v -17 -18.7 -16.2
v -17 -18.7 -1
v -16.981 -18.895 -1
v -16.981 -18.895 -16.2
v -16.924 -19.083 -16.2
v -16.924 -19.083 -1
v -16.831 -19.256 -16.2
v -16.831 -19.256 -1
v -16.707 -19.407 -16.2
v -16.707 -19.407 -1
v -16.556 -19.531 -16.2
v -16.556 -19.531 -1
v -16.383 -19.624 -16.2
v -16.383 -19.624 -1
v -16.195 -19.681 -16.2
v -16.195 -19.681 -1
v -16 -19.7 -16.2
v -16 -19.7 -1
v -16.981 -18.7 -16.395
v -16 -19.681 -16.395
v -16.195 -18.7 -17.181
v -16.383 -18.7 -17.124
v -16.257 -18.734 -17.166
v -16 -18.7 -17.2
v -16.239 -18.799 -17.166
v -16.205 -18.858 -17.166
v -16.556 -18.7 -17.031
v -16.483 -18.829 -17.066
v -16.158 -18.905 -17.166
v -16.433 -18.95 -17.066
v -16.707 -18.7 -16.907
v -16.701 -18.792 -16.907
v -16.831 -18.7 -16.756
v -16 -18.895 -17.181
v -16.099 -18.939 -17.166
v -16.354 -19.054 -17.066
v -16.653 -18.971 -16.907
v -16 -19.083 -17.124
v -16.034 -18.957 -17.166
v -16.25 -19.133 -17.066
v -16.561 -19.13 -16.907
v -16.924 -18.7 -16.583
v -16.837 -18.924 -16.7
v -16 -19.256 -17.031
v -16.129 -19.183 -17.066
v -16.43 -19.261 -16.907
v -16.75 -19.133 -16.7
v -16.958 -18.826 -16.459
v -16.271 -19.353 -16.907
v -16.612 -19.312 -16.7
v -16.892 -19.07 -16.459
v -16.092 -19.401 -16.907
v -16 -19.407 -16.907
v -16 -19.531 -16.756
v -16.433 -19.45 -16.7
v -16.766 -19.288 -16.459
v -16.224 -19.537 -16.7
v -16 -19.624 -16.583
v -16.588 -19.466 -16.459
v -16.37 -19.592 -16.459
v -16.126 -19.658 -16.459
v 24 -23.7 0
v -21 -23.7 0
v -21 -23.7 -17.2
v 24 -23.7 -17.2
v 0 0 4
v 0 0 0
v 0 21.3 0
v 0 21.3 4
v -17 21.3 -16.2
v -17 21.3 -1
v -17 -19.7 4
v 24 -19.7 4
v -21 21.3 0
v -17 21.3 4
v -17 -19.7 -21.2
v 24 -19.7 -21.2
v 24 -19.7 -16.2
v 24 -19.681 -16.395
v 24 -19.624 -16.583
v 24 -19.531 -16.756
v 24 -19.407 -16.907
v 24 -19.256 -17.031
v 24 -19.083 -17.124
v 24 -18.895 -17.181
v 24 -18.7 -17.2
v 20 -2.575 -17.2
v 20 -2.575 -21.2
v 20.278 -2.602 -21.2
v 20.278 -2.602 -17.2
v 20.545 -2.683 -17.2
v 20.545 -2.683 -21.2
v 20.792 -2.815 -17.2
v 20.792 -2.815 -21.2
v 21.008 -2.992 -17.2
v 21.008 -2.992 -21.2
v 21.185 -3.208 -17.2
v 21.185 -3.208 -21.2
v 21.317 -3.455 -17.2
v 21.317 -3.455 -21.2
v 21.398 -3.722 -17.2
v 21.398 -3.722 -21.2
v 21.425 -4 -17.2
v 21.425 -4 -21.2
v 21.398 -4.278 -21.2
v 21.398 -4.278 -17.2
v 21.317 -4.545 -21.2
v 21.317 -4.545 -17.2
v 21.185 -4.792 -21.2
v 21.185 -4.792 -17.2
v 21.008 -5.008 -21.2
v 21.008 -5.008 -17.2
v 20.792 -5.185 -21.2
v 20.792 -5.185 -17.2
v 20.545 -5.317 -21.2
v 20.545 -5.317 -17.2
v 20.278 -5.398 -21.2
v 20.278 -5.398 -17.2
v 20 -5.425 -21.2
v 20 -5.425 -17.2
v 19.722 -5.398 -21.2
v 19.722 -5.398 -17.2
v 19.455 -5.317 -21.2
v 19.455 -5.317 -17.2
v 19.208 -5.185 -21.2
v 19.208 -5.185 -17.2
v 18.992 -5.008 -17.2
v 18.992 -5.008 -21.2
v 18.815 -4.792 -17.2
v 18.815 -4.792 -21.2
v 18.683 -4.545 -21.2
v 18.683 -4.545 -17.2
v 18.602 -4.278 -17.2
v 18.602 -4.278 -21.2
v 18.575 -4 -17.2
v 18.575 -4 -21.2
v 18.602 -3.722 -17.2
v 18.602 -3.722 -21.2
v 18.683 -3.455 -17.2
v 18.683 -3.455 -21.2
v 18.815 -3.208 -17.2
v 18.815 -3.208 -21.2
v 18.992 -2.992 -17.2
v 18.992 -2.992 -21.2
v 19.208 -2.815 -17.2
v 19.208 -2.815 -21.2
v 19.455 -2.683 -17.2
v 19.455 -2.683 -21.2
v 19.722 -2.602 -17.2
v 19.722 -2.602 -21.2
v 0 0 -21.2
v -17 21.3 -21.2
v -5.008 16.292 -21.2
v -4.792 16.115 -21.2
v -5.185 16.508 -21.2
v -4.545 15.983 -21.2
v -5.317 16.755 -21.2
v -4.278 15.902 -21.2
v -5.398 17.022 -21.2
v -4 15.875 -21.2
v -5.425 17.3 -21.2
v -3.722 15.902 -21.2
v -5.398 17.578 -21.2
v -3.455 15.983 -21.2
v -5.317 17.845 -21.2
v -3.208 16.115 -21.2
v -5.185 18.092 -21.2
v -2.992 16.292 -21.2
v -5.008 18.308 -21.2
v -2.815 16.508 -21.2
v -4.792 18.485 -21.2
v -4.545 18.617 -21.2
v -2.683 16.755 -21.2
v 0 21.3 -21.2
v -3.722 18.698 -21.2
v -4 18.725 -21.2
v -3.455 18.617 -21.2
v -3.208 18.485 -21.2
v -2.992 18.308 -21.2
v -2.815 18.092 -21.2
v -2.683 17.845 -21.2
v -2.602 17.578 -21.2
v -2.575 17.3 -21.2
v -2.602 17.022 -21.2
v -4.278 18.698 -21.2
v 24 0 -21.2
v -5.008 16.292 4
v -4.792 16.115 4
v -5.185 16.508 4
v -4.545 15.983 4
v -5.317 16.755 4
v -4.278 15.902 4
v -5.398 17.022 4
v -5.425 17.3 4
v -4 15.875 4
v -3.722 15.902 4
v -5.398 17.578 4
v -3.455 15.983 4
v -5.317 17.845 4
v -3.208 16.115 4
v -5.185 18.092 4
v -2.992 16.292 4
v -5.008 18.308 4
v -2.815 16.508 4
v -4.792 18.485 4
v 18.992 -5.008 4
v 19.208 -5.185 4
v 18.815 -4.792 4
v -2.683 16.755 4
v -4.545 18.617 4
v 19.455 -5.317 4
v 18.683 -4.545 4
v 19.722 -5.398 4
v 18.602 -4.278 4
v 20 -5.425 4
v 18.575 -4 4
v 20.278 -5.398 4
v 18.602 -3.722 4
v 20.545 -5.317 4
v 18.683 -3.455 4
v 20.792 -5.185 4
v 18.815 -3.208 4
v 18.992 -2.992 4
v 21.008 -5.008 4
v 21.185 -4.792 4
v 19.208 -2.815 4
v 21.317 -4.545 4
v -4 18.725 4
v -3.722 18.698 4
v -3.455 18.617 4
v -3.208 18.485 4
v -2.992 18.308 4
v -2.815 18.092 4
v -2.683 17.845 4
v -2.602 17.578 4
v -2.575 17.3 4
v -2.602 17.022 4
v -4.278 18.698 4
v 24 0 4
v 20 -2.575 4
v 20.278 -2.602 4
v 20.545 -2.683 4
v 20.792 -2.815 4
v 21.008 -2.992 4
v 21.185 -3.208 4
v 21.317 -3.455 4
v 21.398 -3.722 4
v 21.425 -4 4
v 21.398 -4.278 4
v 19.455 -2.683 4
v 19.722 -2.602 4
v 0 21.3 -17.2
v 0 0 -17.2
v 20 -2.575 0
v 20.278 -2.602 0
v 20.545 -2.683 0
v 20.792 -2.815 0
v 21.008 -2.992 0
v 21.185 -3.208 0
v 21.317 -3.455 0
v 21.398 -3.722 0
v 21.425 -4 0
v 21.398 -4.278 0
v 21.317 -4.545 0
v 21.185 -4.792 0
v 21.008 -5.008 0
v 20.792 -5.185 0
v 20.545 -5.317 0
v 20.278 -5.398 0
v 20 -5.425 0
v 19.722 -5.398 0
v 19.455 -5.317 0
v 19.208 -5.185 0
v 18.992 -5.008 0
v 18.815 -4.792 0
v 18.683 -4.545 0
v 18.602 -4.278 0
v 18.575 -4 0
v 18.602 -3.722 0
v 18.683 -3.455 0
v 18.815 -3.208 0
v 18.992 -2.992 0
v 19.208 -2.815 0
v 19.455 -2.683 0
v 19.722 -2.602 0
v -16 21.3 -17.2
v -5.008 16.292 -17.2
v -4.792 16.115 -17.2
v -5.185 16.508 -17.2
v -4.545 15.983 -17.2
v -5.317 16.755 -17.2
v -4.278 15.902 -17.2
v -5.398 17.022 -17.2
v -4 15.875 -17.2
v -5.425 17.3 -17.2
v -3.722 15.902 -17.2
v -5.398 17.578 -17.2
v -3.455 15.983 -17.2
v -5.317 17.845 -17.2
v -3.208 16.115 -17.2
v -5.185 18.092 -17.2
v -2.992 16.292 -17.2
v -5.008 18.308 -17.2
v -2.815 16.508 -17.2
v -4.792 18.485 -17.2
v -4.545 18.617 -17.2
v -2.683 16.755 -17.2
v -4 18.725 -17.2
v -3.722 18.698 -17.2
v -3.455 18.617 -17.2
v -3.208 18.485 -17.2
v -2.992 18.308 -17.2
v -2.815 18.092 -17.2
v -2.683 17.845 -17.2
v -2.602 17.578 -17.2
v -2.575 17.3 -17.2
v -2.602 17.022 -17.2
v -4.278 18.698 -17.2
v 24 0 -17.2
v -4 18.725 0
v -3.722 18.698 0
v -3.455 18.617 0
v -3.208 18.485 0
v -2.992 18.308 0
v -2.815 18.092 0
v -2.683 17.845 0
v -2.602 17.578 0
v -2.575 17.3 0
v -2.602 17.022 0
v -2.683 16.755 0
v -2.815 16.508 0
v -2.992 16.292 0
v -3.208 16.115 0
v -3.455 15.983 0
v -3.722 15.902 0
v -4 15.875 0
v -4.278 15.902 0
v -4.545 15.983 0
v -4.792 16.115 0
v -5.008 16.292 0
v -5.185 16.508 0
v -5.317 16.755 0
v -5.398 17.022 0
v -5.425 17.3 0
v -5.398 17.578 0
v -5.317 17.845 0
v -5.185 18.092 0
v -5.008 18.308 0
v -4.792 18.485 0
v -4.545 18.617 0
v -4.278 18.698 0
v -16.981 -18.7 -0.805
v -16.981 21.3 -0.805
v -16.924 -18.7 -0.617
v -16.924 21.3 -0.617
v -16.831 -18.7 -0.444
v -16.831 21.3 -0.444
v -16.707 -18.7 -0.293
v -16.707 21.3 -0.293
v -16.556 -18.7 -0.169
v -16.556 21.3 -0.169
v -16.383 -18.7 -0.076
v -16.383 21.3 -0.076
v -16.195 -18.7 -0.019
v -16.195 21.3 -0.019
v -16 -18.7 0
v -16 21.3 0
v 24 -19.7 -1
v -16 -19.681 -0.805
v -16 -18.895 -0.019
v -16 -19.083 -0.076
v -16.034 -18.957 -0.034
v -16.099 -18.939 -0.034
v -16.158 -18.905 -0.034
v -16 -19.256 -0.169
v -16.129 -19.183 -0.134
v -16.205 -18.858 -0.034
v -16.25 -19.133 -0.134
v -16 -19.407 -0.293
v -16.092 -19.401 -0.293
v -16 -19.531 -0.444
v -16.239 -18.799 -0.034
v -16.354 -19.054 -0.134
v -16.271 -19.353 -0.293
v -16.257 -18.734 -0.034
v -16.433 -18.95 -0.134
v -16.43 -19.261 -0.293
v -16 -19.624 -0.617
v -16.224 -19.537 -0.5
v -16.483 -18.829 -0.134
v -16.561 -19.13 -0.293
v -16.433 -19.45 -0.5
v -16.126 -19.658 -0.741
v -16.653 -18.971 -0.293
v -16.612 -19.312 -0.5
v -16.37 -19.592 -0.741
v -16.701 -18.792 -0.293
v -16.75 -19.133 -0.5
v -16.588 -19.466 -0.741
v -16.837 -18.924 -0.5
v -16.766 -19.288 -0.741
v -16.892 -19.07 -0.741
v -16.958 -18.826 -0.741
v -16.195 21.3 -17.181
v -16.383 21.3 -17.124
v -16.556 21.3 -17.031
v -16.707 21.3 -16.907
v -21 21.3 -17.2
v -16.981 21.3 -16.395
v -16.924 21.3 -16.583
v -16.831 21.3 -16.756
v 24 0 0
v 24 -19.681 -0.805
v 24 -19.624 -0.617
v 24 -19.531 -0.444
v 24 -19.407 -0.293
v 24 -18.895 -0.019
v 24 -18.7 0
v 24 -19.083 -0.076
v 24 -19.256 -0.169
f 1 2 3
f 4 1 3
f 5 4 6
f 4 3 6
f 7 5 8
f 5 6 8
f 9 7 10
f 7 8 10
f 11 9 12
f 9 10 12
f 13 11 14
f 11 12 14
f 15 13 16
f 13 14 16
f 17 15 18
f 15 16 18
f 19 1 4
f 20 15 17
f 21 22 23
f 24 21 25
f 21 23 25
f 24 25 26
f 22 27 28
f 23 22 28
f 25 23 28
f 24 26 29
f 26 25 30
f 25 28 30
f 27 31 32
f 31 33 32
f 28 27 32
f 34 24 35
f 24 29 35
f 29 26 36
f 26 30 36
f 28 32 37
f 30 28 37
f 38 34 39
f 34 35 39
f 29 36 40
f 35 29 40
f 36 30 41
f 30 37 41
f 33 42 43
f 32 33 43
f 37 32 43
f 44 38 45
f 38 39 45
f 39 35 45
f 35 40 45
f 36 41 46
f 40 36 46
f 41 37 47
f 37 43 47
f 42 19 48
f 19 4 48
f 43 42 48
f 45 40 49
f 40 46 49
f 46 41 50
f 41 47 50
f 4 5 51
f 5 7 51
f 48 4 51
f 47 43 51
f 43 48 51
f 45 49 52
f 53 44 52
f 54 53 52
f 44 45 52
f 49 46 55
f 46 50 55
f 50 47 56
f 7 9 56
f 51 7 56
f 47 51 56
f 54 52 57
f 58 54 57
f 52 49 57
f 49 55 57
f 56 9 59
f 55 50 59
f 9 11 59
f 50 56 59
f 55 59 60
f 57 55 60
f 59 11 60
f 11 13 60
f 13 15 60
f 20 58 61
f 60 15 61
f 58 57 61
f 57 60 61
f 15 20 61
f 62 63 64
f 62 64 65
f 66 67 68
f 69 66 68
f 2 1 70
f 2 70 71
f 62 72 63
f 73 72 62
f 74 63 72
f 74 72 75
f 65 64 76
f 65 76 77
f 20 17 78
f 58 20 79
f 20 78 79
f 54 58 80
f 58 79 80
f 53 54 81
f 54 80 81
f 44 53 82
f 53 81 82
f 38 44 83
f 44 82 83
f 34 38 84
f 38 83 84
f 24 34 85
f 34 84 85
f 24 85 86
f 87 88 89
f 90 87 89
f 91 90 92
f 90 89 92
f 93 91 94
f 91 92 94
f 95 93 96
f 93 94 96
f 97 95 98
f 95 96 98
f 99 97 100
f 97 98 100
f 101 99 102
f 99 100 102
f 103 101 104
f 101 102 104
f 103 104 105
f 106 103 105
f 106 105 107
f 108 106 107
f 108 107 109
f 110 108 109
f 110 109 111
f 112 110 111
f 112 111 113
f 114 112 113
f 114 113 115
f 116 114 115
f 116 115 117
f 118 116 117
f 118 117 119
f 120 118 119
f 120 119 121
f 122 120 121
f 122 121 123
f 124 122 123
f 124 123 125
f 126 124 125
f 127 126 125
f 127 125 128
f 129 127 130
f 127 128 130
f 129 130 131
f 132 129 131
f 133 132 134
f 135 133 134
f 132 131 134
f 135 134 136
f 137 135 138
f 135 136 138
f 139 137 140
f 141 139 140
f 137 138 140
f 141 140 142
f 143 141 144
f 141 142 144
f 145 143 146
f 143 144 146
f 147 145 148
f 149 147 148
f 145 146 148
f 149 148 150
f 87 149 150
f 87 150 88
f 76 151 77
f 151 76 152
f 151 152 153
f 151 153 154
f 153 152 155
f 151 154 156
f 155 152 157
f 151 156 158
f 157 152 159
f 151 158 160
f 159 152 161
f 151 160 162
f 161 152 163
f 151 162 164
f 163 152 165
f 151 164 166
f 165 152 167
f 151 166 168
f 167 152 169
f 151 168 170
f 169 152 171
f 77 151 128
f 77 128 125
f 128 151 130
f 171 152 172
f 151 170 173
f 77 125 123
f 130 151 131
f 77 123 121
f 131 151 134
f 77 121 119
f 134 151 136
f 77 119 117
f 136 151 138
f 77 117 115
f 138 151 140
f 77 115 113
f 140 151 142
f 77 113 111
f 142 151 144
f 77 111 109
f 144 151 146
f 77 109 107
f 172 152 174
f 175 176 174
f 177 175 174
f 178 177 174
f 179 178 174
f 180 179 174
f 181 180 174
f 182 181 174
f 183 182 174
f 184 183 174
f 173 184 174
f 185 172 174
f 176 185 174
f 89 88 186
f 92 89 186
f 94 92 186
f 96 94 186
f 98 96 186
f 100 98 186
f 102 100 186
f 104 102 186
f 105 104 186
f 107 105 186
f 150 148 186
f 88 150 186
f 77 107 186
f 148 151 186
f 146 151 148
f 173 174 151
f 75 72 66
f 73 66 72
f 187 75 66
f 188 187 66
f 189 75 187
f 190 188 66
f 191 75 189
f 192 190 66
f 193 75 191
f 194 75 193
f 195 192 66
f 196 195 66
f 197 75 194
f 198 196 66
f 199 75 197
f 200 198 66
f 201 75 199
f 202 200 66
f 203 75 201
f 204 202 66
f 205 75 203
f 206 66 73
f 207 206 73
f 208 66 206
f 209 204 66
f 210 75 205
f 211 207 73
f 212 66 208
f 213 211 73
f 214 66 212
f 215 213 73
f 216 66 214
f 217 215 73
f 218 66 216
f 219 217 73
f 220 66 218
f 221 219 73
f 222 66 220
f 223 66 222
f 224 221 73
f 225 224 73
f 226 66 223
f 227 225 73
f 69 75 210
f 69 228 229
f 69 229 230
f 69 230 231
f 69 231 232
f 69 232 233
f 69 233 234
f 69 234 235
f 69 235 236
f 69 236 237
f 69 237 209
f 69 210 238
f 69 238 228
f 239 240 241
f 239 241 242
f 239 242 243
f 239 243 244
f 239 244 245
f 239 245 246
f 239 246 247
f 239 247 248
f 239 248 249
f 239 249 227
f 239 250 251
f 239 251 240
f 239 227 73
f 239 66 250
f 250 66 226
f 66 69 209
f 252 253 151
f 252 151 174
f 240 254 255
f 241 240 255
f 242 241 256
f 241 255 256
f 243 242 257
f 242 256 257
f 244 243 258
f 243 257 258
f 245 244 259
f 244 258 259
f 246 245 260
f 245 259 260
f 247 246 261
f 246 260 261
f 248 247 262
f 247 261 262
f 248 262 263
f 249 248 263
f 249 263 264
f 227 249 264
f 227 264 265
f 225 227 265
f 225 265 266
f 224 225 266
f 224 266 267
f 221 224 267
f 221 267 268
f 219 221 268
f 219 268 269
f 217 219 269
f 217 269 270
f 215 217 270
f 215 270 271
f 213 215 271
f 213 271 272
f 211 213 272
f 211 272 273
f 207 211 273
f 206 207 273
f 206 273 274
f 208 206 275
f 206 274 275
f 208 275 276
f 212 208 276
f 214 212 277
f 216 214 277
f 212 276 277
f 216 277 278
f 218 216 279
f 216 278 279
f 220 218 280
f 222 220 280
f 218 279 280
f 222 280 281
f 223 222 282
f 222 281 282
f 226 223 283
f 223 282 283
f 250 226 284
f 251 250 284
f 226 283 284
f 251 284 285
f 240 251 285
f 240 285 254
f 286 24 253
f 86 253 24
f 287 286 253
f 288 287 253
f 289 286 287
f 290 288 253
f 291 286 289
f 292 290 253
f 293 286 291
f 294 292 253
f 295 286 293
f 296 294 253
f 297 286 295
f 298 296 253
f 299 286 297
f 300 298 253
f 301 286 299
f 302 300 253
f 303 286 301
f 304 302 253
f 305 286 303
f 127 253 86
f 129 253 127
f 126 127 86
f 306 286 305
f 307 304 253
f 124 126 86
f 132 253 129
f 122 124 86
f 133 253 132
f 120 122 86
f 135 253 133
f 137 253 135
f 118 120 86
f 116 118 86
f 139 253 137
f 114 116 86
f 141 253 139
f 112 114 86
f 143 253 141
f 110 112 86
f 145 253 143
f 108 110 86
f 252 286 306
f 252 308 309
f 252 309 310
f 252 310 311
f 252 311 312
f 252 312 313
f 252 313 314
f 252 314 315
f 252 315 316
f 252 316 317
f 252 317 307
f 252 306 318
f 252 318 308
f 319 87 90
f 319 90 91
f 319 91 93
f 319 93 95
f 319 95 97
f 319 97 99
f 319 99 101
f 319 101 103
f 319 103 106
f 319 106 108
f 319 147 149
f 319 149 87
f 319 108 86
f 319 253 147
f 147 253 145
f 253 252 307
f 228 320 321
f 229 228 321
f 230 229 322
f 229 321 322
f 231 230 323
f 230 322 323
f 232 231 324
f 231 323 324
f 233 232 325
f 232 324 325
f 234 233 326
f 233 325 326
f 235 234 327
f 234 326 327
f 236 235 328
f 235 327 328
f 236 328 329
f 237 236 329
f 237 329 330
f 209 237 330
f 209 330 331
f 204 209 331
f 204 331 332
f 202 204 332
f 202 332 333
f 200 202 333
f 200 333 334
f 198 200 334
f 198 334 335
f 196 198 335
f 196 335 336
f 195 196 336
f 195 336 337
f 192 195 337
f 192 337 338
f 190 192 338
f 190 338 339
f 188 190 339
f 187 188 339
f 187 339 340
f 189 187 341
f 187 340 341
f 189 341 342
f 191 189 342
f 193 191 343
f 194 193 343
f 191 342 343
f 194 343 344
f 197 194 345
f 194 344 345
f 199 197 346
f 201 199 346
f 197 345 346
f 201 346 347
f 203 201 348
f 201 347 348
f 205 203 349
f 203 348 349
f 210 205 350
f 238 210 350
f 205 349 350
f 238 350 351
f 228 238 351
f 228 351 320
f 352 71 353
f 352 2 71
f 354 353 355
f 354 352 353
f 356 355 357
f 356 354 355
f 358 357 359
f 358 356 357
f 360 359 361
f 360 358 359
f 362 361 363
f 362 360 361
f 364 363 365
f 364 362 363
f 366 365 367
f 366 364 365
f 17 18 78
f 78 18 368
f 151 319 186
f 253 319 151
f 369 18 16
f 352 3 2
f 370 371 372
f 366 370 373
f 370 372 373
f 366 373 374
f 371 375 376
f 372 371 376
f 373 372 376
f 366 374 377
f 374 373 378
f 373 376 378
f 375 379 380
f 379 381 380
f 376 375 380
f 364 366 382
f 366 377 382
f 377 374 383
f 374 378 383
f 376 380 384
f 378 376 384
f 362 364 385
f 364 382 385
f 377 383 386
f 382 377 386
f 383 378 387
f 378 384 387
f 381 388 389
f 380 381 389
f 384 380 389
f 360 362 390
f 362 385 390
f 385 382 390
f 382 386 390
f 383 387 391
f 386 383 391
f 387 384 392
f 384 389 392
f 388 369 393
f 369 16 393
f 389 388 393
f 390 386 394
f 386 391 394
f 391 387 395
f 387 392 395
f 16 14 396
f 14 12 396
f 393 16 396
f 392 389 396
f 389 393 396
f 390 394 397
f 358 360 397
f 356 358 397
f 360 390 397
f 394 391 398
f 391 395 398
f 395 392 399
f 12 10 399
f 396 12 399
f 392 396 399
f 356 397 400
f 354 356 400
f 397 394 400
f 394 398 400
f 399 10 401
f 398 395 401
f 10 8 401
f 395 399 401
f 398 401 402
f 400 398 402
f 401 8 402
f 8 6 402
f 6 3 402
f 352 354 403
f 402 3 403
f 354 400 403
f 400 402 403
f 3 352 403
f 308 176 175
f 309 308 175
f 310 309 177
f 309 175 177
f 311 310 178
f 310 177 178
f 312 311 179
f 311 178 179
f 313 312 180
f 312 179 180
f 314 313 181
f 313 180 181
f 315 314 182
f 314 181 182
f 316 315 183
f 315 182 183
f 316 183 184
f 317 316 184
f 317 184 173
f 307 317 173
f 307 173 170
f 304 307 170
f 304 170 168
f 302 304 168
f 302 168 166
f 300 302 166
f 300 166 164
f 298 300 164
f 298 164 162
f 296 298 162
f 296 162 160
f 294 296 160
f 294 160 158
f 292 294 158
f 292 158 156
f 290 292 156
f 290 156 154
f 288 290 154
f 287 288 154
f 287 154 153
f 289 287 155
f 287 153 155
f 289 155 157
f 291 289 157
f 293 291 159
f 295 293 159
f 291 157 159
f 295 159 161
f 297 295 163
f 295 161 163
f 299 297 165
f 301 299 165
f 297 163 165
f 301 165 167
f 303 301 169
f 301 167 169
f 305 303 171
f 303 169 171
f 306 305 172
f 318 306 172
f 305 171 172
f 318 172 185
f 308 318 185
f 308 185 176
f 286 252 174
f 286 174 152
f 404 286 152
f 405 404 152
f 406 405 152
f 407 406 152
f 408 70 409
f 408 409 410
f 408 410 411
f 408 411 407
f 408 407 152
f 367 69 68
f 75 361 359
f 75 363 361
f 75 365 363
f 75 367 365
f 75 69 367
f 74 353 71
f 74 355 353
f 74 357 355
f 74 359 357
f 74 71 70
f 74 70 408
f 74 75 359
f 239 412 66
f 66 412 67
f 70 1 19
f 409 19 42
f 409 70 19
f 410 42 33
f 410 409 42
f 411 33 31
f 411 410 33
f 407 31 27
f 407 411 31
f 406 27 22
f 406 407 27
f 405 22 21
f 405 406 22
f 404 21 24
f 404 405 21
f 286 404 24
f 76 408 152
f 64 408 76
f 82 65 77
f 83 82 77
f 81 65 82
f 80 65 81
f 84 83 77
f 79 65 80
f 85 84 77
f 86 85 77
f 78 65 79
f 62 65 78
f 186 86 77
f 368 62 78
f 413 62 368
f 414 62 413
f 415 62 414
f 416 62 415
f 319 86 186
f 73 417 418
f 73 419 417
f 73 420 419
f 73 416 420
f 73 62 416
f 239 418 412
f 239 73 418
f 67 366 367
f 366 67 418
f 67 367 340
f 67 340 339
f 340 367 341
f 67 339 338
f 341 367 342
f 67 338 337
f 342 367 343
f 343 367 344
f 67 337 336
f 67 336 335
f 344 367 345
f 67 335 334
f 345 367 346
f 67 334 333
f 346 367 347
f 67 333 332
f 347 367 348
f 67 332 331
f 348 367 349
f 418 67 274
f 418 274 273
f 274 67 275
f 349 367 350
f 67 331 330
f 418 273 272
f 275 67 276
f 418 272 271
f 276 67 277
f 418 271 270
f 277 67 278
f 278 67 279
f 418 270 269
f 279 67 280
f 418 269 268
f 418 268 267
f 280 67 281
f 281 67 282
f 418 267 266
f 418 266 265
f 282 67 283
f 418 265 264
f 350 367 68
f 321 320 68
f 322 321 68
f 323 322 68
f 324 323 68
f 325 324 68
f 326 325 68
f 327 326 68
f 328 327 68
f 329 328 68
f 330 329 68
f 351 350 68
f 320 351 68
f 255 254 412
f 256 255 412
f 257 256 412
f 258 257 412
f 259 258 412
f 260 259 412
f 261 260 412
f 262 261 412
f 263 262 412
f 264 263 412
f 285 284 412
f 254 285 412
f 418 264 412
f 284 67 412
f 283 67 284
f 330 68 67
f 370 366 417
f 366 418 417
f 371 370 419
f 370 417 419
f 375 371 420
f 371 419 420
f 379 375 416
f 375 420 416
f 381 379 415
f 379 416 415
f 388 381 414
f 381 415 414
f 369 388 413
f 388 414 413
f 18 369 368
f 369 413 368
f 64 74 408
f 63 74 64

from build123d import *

# Parameters (mm, degrees)
SALIENTE_EXTRUIR1_DEPTH = 4
CROQUIS2_W              = 17.2
CROQUIS2_H              = 41
CROQUIS2_W_2            = 4
SALIENTE_EXTRUIR2_DEPTH = 4
CROQUIS3_W              = 45
CROQUIS3_H              = 21.2
SALIENTE_EXTRUIR3_DEPTH = 4
SALIENTE_EXTRUIR4_DEPTH = 4
REDONDEO1_R             = 1
CHAFL_N1_SIZE           = 4
CROQUIS6_R              = 1.425
CORTAR_EXTRUIR2_DEPTH   = 43.103800304


with BuildPart() as part:
    # Croquis1 → Saliente-Extruir1 (new body)
    with BuildSketch(Plane.XY):
        Polygon((0, 0), (0, 21.3), (-17, 21.3), (-17, -19.7), (24, -19.7), (24, 0), align=None)
    extrude(amount=SALIENTE_EXTRUIR1_DEPTH)

    # Croquis2 → Saliente-Extruir2 (add)
    with BuildSketch(Plane.ZY.offset(17)):
        with Locations((-8.6, 0.8)):
            Rectangle(CROQUIS2_W, CROQUIS2_H)
        with Locations((2, 0.8)):
            Rectangle(CROQUIS2_W_2, CROQUIS2_H)
    extrude(amount=SALIENTE_EXTRUIR2_DEPTH)

    # Croquis3 → Saliente-Extruir3 (add)
    with BuildSketch(Plane.XZ.offset(19.7)):
        with Locations((1.5, -6.6)):
            Rectangle(CROQUIS3_W, CROQUIS3_H)
    extrude(amount=SALIENTE_EXTRUIR3_DEPTH)

    # Croquis4 → Saliente-Extruir4 (add)
    with BuildSketch(Plane(origin=(0, 0, -17.2), x_dir=(-1, 0, 0), z_dir=(0, 0, -1))):
        Polygon((-24, -23.7), (-24, 0), (0, 0), (0, 21.3), (21, 21.3), (21, -23.7), align=None)
    extrude(amount=SALIENTE_EXTRUIR4_DEPTH)

    # Redondeo1
    redondeo1_edges = [part.edges().sort_by_distance(p)[0] for p in [
        (-17, -19.7, -8.6),
        (-17, 0.8, -17.2),
        (3.5, -19.7, -17.2),
        (3.5, -19.7, 0),
        (-17, 0.8, 0),
    ]]
    fillet(redondeo1_edges, radius=REDONDEO1_R)

    # Chaflán1
    chafl_n1_edges = [part.edges().sort_by_distance(p)[0] for p in [
        (-21, -1.2, 4),
        (1.5, -23.7, 4),
        (1.5, -23.7, -21.2),
        (-21, -1.2, -21.2),
    ]]
    chamfer(chafl_n1_edges, length=CHAFL_N1_SIZE)

    # Croquis6 → Cortar-Extruir2 (cut, through all)
    with BuildSketch(Plane(origin=(0, 0, -21.2), x_dir=(-1, 0, 0), z_dir=(0, 0, -1))):
        with Locations(Location((-20, -4, 0), (0, 0, 90))):
            Circle(CROQUIS6_R)
        with Locations(Location((4, 17.3, 0), (0, 0, 90))):
            Circle(CROQUIS6_R)
    extrude(amount=-CORTAR_EXTRUIR2_DEPTH, mode=Mode.SUBTRACT)


solid = part.part
